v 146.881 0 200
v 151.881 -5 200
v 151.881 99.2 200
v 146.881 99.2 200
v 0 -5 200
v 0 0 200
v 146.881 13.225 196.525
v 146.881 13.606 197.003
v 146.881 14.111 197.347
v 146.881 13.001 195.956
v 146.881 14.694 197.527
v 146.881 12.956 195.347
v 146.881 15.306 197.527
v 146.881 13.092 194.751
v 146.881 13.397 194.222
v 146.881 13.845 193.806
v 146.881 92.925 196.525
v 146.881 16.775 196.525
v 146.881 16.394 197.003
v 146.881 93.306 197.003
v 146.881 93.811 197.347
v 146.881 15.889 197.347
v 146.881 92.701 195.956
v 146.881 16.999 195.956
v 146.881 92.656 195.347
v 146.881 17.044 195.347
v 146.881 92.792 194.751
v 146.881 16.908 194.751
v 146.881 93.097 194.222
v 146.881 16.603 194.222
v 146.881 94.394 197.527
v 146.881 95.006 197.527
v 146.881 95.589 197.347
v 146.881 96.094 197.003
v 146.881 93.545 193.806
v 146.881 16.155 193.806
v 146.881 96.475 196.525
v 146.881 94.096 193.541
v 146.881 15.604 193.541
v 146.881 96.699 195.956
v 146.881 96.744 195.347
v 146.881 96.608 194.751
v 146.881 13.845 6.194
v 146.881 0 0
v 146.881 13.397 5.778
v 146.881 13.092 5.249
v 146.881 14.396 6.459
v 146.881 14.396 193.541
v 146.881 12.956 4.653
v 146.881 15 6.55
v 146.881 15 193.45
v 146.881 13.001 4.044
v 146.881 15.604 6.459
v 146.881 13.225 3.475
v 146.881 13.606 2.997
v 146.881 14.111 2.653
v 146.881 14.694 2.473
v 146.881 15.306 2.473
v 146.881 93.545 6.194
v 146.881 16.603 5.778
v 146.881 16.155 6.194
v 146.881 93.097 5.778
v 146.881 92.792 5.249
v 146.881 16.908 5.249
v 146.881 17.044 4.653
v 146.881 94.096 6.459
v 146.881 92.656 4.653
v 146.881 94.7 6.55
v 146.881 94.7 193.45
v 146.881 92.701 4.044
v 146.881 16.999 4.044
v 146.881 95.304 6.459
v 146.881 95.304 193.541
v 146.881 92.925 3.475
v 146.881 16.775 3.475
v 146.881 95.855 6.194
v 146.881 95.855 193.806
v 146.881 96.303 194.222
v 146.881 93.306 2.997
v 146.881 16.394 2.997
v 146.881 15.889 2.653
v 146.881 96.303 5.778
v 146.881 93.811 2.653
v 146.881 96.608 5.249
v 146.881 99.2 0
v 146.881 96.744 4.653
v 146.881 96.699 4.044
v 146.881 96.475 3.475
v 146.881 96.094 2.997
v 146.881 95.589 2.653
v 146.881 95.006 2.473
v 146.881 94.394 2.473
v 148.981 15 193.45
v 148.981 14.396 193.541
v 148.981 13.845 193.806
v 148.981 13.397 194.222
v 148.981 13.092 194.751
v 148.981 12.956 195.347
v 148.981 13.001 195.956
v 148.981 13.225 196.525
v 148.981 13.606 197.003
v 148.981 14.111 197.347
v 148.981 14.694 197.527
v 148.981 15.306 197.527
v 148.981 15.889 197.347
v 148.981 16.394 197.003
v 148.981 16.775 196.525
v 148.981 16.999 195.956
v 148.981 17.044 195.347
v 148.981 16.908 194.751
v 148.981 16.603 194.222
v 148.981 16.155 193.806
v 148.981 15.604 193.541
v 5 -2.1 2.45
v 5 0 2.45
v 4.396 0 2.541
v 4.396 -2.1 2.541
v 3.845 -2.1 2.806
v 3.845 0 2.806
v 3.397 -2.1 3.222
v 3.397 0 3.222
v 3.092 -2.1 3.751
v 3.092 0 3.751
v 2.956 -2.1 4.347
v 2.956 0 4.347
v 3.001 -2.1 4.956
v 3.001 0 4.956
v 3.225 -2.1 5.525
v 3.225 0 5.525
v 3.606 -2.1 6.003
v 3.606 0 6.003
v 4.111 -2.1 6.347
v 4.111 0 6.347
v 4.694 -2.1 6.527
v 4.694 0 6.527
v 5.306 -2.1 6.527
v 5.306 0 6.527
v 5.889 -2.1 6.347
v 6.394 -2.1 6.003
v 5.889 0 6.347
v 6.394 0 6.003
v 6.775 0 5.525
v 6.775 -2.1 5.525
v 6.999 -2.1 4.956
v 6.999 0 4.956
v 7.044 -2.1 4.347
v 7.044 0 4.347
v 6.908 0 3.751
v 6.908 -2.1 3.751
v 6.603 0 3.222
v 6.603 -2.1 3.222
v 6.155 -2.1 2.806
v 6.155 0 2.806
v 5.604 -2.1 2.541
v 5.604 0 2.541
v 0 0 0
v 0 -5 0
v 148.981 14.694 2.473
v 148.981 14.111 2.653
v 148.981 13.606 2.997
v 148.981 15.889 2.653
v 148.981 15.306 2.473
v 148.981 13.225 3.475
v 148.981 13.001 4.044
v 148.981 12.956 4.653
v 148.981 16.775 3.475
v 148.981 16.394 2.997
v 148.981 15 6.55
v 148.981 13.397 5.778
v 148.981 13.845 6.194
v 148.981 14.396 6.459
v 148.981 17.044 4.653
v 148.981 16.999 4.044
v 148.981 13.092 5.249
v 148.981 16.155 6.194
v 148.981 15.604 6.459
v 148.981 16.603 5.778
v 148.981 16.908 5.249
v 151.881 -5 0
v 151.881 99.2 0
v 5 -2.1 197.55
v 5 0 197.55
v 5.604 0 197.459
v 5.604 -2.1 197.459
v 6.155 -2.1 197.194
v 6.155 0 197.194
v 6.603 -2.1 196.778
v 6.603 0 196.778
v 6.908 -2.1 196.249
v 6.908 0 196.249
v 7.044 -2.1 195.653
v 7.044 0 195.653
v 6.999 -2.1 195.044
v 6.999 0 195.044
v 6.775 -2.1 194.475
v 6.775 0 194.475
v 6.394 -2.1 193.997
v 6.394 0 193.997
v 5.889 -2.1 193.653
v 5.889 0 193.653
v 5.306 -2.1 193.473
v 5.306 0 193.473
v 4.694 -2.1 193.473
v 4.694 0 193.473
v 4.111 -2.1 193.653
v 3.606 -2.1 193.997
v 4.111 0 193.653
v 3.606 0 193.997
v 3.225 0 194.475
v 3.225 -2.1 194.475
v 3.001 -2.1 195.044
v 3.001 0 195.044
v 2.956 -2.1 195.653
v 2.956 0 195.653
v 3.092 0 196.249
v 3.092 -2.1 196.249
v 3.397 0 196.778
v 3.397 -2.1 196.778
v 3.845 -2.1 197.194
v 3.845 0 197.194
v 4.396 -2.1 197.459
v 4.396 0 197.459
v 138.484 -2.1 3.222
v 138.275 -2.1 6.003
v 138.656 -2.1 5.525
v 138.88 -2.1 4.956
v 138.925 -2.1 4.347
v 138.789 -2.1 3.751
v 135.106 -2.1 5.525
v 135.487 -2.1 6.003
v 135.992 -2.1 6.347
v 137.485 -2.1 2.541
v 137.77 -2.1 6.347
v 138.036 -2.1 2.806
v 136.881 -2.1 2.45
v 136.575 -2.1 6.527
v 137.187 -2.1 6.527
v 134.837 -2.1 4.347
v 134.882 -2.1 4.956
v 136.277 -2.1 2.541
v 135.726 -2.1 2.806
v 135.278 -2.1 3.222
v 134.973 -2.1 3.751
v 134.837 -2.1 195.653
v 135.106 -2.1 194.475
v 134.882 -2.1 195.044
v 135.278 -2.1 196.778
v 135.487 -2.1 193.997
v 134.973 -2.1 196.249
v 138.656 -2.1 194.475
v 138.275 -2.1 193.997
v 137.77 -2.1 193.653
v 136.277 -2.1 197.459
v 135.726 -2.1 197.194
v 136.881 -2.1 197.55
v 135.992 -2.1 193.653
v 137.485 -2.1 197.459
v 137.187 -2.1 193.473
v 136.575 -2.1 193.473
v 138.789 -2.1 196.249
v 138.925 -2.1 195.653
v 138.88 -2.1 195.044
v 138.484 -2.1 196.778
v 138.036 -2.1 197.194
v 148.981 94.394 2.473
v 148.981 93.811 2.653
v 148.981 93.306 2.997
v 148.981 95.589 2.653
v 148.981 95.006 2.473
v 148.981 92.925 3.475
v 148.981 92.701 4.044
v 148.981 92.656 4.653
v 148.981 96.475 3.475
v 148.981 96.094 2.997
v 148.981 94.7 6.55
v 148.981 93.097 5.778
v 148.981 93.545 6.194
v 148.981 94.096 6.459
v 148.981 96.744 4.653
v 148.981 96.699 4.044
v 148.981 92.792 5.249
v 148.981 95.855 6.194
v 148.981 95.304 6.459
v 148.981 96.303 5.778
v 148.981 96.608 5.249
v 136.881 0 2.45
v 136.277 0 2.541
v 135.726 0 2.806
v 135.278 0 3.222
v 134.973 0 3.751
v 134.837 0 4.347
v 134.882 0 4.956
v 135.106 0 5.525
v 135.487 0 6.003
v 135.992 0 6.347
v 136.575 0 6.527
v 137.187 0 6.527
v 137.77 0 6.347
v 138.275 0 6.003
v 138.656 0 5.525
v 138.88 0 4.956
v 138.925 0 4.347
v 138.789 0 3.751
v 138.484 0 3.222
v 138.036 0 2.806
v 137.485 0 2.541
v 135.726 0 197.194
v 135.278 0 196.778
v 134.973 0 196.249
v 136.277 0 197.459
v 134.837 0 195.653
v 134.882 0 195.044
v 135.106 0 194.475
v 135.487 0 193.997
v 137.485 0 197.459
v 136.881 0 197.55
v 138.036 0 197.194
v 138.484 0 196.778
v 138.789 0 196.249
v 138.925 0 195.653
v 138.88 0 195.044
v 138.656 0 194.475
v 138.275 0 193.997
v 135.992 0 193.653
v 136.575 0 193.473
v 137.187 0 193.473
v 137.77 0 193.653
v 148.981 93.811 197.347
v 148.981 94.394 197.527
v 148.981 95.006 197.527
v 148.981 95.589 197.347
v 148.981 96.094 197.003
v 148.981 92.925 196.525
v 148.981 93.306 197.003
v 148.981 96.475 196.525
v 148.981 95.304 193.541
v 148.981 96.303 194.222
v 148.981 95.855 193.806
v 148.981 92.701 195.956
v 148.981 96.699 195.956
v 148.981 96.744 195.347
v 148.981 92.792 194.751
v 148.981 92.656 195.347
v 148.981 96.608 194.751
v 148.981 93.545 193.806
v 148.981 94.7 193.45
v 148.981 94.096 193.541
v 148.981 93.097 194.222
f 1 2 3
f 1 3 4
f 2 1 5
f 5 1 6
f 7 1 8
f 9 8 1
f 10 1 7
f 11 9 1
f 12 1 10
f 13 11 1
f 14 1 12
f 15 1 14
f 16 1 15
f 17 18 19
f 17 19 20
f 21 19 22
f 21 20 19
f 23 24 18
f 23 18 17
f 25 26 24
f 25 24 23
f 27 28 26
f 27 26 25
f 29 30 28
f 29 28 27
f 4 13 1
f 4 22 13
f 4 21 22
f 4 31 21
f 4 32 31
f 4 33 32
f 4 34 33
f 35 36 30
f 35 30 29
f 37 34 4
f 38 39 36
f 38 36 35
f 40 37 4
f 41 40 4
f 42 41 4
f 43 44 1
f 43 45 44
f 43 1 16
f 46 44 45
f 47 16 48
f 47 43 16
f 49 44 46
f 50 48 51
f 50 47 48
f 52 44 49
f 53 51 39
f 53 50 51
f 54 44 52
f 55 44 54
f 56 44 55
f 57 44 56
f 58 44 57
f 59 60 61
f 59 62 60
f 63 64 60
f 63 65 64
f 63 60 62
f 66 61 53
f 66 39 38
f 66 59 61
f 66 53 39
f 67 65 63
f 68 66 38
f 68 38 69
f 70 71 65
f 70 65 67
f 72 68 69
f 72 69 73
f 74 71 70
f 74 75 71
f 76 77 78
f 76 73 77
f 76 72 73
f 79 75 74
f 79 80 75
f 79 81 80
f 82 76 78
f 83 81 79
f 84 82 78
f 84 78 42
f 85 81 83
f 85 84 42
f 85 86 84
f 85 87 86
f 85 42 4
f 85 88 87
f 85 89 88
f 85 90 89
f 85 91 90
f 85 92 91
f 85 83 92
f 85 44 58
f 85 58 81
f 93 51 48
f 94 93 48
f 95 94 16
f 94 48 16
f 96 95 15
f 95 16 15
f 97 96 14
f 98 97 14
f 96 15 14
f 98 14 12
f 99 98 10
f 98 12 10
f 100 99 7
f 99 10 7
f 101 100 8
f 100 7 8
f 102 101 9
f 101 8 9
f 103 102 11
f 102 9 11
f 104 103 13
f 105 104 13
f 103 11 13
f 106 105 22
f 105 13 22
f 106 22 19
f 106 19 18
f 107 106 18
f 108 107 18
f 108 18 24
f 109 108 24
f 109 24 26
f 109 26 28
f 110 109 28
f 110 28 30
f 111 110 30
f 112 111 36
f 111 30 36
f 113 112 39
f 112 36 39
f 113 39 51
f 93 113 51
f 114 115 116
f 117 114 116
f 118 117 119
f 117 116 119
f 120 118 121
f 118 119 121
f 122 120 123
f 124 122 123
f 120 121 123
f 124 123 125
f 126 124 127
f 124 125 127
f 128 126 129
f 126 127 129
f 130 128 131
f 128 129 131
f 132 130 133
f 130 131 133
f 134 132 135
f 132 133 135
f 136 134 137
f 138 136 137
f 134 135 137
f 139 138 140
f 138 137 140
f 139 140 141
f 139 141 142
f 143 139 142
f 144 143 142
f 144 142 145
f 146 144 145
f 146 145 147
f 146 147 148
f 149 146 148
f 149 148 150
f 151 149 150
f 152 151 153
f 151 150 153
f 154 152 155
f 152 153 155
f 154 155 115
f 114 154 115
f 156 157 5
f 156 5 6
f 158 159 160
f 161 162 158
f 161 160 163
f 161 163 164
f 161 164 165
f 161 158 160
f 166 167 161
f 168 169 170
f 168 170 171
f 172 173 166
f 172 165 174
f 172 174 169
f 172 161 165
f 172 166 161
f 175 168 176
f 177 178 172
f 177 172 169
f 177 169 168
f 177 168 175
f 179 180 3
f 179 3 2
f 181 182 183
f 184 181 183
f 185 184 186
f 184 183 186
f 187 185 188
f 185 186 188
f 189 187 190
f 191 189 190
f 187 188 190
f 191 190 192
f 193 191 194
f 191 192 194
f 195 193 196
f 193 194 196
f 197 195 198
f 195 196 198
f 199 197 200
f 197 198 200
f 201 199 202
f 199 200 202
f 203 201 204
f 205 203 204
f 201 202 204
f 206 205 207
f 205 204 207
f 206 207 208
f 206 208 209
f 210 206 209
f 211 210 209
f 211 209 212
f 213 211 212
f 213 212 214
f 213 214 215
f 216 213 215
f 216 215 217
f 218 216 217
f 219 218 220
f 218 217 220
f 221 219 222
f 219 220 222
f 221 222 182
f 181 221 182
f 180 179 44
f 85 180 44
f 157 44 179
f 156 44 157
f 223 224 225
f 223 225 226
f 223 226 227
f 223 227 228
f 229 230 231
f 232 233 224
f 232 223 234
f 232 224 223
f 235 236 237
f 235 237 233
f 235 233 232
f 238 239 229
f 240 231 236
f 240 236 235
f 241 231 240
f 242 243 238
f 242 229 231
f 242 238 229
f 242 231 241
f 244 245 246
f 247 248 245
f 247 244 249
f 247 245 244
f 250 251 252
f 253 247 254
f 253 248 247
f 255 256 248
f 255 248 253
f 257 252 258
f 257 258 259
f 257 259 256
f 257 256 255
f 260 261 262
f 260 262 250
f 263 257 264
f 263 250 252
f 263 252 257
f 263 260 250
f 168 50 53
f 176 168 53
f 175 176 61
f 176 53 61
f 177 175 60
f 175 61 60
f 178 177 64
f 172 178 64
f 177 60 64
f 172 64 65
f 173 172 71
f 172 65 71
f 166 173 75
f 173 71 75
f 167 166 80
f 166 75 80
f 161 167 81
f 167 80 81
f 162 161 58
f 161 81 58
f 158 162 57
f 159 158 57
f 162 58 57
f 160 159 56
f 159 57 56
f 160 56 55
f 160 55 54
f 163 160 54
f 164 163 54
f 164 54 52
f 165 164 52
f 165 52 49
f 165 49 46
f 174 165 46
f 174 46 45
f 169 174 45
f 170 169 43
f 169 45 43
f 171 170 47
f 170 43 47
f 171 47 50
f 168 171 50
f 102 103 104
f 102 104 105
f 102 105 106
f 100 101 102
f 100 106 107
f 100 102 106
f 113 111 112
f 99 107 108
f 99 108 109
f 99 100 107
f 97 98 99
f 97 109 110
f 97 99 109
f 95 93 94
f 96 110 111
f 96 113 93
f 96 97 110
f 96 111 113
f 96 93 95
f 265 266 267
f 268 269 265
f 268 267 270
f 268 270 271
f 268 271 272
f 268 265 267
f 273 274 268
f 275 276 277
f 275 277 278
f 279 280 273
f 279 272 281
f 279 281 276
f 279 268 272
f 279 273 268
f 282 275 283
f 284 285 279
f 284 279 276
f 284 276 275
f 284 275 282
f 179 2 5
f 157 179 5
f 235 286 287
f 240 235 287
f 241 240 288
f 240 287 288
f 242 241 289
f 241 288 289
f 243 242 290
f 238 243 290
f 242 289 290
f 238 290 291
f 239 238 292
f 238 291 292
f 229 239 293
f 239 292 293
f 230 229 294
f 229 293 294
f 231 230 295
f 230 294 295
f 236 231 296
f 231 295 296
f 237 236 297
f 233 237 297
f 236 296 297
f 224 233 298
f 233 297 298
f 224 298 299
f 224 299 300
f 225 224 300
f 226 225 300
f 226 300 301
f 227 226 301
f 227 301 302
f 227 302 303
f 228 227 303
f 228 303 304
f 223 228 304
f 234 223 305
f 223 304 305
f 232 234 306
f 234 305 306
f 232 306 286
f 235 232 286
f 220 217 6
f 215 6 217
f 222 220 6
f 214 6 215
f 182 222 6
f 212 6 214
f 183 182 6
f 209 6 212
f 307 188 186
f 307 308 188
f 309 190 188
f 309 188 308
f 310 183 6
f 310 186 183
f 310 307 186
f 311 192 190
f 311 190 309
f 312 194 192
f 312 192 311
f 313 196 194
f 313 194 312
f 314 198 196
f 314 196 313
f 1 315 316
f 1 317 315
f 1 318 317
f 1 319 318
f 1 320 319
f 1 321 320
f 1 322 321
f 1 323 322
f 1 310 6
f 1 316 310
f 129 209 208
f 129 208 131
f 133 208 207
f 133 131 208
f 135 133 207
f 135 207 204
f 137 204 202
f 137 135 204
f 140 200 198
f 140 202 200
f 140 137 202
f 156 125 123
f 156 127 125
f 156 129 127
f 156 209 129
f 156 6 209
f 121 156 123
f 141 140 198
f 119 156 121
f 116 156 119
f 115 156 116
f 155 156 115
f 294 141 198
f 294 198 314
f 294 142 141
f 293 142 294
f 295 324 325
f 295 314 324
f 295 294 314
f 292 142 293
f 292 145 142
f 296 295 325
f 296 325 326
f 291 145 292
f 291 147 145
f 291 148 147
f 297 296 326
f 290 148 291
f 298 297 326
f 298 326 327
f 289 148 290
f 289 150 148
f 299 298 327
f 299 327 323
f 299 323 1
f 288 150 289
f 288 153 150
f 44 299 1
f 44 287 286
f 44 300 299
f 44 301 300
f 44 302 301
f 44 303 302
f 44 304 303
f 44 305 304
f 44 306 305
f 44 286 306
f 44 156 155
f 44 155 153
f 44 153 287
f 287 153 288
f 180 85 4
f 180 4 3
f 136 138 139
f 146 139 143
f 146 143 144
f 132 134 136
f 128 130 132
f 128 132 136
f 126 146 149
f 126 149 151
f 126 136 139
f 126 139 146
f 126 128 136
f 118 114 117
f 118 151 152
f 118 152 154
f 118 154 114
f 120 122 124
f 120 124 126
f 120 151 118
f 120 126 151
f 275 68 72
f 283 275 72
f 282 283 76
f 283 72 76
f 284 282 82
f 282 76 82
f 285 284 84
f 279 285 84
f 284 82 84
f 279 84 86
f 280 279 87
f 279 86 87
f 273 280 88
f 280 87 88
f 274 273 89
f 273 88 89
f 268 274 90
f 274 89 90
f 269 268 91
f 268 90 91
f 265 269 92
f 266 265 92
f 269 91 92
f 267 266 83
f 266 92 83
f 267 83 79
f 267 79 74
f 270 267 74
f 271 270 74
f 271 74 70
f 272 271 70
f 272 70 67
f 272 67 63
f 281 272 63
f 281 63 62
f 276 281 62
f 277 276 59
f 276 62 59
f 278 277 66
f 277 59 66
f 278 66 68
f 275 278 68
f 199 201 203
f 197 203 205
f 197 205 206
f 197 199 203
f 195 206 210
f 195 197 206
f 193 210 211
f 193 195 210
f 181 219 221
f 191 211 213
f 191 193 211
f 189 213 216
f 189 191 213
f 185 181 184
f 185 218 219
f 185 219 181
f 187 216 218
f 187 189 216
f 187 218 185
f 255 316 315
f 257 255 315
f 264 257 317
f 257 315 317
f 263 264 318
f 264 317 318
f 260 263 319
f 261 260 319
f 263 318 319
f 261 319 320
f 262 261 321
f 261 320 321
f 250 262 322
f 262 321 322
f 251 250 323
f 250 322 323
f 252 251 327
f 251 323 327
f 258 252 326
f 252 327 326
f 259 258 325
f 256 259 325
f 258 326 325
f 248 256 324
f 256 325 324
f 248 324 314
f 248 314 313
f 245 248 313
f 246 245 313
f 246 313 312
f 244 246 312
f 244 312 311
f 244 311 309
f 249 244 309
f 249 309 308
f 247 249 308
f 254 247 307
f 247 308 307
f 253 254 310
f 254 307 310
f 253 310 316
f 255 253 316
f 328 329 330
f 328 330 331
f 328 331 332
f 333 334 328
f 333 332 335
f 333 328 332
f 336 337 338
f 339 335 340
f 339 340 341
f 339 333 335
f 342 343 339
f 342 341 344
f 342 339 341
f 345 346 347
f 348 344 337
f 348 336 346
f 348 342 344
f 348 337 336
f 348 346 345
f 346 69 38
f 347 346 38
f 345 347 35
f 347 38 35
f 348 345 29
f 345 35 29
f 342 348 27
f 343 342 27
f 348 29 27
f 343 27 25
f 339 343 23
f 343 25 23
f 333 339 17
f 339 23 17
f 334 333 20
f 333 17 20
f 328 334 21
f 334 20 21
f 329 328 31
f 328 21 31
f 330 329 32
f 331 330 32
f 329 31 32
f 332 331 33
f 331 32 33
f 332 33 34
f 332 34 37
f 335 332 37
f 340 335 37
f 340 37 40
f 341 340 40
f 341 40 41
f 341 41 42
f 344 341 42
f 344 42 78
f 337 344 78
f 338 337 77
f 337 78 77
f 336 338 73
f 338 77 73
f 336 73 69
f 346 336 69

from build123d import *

# Parameters (mm, degrees)
SALIENTE_EXTRUIR1_DEPTH = 200
CROQUIS3_R              = 2.05
CORTAR_EXTRUIR1_DEPTH   = 2.1
CROQUIS4_R              = 2.05
CORTAR_EXTRUIR2_DEPTH   = 2.1


with BuildPart() as part:
    # Croquis2 → Saliente-Extruir1 (new body)
    with BuildSketch(Plane.XY):
        Polygon((0, 0), (146.881, 0), (146.881, 99.2), (151.881, 99.2), (151.881, -5), (0, -5), align=None)
    extrude(amount=SALIENTE_EXTRUIR1_DEPTH)

    # Croquis3 → Cortar-Extruir1 (cut)
    with BuildSketch(Plane(origin=(0, 0, 0), x_dir=(1, 0, 0), z_dir=(0, 1, 0))):
        with Locations(Location((5, -195.5, 0), (0, 0, 270))):
            Circle(CROQUIS3_R)
        with Locations(Location((136.881, -195.5, 0), (0, 0, 270))):
            Circle(CROQUIS3_R)
        with Locations(Location((136.881, -4.5, 0), (0, 0, 90))):
            Circle(CROQUIS3_R)
        with Locations(Location((5, -4.5, 0), (0, 0, 90))):
            Circle(CROQUIS3_R)
    extrude(amount=-CORTAR_EXTRUIR1_DEPTH, mode=Mode.SUBTRACT)

    # Croquis4 → Cortar-Extruir2 (cut)
    with BuildSketch(Plane.ZY.offset(-146.881)):
        with Locations((4.5, 15)):
            Circle(CROQUIS4_R)
        with Locations((4.5, 94.7)):
            Circle(CROQUIS4_R)
        with Locations(Location((195.5, 15, 0), (0, 0, 180))):
            Circle(CROQUIS4_R)
        with Locations(Location((195.5, 94.7, 0), (0, 0, 180))):
            Circle(CROQUIS4_R)
    extrude(amount=-CORTAR_EXTRUIR2_DEPTH, mode=Mode.SUBTRACT)


solid = part.part
